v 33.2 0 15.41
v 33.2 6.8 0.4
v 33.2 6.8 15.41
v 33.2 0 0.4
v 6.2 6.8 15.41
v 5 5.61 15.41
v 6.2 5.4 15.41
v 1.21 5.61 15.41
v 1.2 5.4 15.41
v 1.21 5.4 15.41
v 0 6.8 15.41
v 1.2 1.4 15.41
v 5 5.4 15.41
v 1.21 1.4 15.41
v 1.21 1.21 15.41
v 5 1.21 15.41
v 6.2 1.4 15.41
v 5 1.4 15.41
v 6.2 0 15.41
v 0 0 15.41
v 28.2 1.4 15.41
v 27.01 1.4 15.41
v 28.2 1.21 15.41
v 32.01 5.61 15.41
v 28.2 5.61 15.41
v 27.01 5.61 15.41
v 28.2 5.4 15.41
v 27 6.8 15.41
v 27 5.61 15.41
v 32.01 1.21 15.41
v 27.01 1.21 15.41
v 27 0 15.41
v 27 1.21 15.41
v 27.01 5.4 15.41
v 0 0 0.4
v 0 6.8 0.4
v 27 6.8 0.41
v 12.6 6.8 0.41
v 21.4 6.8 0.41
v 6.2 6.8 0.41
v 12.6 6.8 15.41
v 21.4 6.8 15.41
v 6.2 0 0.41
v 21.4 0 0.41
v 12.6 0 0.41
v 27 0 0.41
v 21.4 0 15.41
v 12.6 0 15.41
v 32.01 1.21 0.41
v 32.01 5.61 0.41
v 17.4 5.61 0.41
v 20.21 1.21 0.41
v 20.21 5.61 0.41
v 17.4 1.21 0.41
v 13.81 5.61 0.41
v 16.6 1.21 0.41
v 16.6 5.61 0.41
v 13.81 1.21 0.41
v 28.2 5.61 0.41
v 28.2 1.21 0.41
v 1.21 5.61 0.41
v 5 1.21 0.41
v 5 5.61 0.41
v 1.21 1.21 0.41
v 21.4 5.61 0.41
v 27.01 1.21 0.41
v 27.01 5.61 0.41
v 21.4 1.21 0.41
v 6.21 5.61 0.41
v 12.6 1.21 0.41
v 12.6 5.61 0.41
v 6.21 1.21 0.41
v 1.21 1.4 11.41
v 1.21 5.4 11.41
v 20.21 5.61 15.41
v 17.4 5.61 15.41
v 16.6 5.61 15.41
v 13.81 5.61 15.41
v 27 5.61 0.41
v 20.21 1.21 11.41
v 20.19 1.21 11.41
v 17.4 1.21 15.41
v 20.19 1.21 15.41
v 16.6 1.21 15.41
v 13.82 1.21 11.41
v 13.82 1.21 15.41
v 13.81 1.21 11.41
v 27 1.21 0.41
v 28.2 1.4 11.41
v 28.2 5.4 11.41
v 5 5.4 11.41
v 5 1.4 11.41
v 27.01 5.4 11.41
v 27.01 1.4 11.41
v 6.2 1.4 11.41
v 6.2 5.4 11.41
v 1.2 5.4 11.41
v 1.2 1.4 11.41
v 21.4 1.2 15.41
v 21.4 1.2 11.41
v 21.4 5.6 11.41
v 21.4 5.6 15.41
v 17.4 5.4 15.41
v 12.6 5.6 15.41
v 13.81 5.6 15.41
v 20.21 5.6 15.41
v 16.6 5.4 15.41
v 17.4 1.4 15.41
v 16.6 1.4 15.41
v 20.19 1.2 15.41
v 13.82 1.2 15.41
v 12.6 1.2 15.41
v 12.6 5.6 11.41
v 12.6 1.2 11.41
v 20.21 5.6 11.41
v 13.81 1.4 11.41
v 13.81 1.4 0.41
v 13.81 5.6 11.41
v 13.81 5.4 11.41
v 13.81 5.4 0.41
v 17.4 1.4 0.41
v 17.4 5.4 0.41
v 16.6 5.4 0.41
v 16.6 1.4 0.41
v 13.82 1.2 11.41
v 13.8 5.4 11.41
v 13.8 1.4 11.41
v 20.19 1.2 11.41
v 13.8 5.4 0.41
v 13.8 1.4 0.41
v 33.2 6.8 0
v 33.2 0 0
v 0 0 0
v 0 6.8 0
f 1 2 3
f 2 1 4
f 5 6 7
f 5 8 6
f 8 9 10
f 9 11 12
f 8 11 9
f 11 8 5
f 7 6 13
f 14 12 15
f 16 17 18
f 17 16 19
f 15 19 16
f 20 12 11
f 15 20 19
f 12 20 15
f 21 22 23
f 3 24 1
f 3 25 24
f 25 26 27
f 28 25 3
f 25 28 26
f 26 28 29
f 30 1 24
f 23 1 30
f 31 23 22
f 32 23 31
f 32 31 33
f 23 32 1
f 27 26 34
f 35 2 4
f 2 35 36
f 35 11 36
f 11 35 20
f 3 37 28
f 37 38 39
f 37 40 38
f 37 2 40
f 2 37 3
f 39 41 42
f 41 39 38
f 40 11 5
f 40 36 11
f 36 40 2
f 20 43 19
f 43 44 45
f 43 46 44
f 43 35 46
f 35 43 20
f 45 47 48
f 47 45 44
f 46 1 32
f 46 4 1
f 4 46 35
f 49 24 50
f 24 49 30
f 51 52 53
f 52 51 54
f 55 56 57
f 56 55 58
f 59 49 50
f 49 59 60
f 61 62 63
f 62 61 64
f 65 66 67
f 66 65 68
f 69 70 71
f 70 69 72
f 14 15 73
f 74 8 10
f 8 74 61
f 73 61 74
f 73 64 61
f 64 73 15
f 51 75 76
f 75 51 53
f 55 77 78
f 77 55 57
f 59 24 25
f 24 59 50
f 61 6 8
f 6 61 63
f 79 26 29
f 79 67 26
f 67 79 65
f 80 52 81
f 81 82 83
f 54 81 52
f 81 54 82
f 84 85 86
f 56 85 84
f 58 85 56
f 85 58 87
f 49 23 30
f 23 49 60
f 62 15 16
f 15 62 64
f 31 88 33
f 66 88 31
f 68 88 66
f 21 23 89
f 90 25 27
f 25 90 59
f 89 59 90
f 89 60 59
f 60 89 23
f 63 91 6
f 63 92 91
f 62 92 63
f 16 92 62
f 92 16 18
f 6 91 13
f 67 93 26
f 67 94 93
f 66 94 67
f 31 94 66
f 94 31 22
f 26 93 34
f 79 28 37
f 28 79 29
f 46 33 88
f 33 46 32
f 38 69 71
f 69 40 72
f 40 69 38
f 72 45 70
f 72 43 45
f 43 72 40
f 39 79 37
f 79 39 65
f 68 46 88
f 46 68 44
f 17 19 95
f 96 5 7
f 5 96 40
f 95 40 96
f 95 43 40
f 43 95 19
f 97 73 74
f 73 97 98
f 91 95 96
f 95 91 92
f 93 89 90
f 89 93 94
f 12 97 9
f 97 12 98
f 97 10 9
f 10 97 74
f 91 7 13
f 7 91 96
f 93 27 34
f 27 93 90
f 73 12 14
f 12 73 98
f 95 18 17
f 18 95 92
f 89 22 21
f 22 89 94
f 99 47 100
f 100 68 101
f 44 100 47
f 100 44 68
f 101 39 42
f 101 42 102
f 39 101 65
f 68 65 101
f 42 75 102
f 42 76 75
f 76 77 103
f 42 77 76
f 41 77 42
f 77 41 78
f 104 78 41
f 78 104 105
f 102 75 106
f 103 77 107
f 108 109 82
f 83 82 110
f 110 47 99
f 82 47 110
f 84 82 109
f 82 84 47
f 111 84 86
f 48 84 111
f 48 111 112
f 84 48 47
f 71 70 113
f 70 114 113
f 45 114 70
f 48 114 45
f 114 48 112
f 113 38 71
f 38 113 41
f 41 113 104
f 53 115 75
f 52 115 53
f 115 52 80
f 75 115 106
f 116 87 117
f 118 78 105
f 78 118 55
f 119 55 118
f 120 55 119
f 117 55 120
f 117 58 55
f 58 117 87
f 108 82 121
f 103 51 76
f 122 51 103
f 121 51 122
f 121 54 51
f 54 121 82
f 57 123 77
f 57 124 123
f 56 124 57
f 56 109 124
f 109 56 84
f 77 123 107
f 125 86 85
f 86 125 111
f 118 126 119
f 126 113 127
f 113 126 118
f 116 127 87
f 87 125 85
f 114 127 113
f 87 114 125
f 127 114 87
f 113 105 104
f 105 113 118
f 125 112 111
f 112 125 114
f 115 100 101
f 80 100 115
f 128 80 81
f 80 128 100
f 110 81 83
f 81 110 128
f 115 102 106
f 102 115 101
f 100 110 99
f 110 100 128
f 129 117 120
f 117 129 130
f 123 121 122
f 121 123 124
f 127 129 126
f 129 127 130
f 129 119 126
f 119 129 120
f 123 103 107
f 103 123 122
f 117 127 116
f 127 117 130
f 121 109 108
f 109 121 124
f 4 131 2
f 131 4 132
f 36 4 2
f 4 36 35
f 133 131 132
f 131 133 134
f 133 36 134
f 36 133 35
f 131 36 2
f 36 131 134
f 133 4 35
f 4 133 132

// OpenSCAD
// file: ../../Base/PlacementOptions.scad
// Fischertechnik Box Foundation
// Placement Options

// Alignment
NoAlign = 0;
AlignLeft = 1;
AlignBottom = 2;
AlignCenter = 3;
AlignRight = 4;
AlignTop = 5;

// Element rotation degree steps
rotations = [0, -90, -180, -270];

// Rotation
NoRotation = 0;
Rotate0 = 0;
Rotate90 = 1;
Rotate180 = 2;
Rotate270 = 3;

// Docking (seen from above)
NoDock = -1;
DockLeft = 0;
DockTop = 1;
DockRight = 2;
DockCorner = 2;
DockBottom = 3;

// Web corners
LowerLeft = 0;
UpperLeft = 1;
UpperRight = 2;
LowerRight = 3;

// Web position relative to corner
LeftOfCorner = 0;
RightOfCorner = 1;
// file: ../../Base/Boxes.scad
// Fischertechnik Box Foundation
// Pre-designed Boxes

use <Constants.scad>

include <PlacementOptions.scad>

box190Width = 190;
box190Depth = 130;
box130Width = 130;
box130Depth = 95;

// Values are from an original ec3 box
topBottomDifference = 1.5;
outerHeight = 40;
baseThickness = 1.8;
innerHeight = outerHeight - baseThickness;
stackExcess = 5.7;
radius = 3.5;
wallThickness = 1.5;
tolerance = 0.2;

boxWallThickness = wallThickness;
boxBaseThickness = baseThickness;
boxWebWidth = 3.0;

// getBoxWallThickness()
// Gets the wall thickness of a Fischertechnik Box
function getBoxWallThickness() = boxWallThickness;

// getBoxUsageHeight(height = 38.2)
// Gets the usable height of a Fischertechnik box
// height = Outer height of the box from the bottom to the upper edge.
function getBoxUsageHeight(height = outerHeight) = height - baseThickness - stackExcess;

// getBoxInnerHeight()
// Gets the inner height of a Fischertechnik box, including the stack excess
function getBoxInnerHeight() = innerHeight;

// getBoxBaseThickness()
// Gets the thickness of the Fischertechnik box base.
function getBoxBaseThickness() = boxBaseThickness;

// getBoxWebWidth()
// Gets the width of a box web
function getBoxWebWidth() = boxWebWidth;

// getBox190Space()
// Gets the usable inner space of a Box 190 as an x/y-list
function getBox190Space() = [
    box190Width - 2*getBoxWallThickness() - topBottomDifference, 
    box190Depth - 2*getBoxWallThickness() - topBottomDifference ];

// RoundedCornerPlate(width, depth, height, radius)
// Creates a body plate with rounded corners for a box. Used
// also to create the complete box with the hull module.
// width = Width of the plate
// depth = depth of the plate 
// height = thickness of the plate
// radius = radius of the rounded corner
module RoundedCornerPlate(width, depth, height, radius) {
    translate([radius, radius])
    hull() {
        w = width-2*radius;
        d = depth-2*radius;
        cube([w, d, height]);
        cylinder(height, r=radius, $fn=getFragments());
        translate([w, 0])
            cylinder(height, r=radius, $fn=getFragments());
        translate([w, d])
            cylinder(height, r=radius, $fn=getFragments());
        translate([0, d])
            cylinder(height, r=radius, $fn=getFragments());
    }
}

// BoxBase(width, depth)
// Creates an empty stackable Fischertechnik compatible box
// width = Outer width of the box (190, 130, ...)
// depth = Outer depth of the box (130, 95, ...)

module BoxBase(width, depth, height=outerHeight) {    
    thinPlate = 0.01;

    innerHeight = height - baseThickness;    
    
    module Body(tolerance=tolerance) {
        hull() {
            // Bottom with tolerance to fit into the original boxes when stacked
            translate([-wallThickness+tolerance, -wallThickness+tolerance, -baseThickness])
                RoundedCornerPlate(width-topBottomDifference-2*tolerance, depth-topBottomDifference-2*tolerance, thinPlate, radius);
            
            // Top
            translate([-wallThickness-topBottomDifference/2, -wallThickness-topBottomDifference/2, innerHeight-thinPlate])
                RoundedCornerPlate(width, depth, thinPlate, radius);
         }
    }

    module Cutoff() {
        hull() {
            coWidth = width - 2*wallThickness;
            coDepth = depth - 2*wallThickness;
            
            // Bottom
            RoundedCornerPlate(coWidth-topBottomDifference, coDepth-topBottomDifference, thinPlate, radius);

            // Top
            translate([-topBottomDifference/2, -topBottomDifference/2, innerHeight+thinPlate]) 
                RoundedCornerPlate(coWidth, coDepth, thinPlate, radius);
        }
    }
    
    difference() {        
        Body();
        Cutoff();
        stackOffset = innerHeight - stackExcess;
        translate([0, 0, stackOffset + baseThickness])
            Body(tolerance=0);
    }
}

// Creates the Fischertechnik empty box 130x190 mm and places it at position 0,0
// 190x130 are the outer sizes, the inner space is slightly smaller. Use getBox190Space() to get the inner sizes.
// The box is positioned that the usable inner space is at the 0,0,0 position.

module Box190() {
    BoxBase(box190Width, box190Depth);
}

// Gets the usable inner space of a Box 130 as an x/y-list
function getBox130Space() = [
    box130Width - 2*getBoxWallThickness() - topBottomDifference, 
    box130Depth - 2*getBoxWallThickness() - topBottomDifference ];

// Creates the Fischertechnik empty box 95x130 mm and places it at position 0,0
// 190x130 are the outer sizes, the inner space is slightly smaller. Use getBox190Space() to get the inner sizes.
// The box is positioned that the usable inner space is at the 0,0,0 position.

module Box130() {
    BoxBase(box130Width, box130Depth);
}

// Creates a web at the specified box walls
// corner 0 = LowerLeft, 1 = UpperLeft, 2 = UpperRight, 3 = LowerRight
// side 0 = LeftOfCorner, 1 = RightOfCorner
// distance = Distance in mm from the corner
// boxSpace = inner width and depth of the box (default: Box 190)
// webWidth = length of the web (default is 3 mms)
// webThickness = thickness of the web (default is 1 mm)
// height = Height of the web (standard is getBoxUsageHeight())

module BoxWeb(corner, side, distance, boxSpace=getBox190Space(), webWidth=getBoxWebWidth(), webThickness=1.0, height=getBoxUsageHeight()) {
    sink = getBoxWallThickness()/2;

    width = (corner % 2 == 0) ? 
            (side == LeftOfCorner ? webWidth : webThickness) :
            (side == LeftOfCorner ? webThickness : webWidth);

    depth = (corner % 2 == 0) ? 
            (side == RightOfCorner ? webWidth : webThickness) :
            (side == RightOfCorner ? webThickness : webWidth);
    
    xDiff = corner == LowerLeft ? 
                (side == LeftOfCorner ? -sink : distance) :
            (corner == UpperLeft ?                
                (side == LeftOfCorner ? distance : -sink) :
            (corner == UpperRight ?
                (side == LeftOfCorner ? boxSpace.x-webWidth+sink : boxSpace.x-distance-webThickness) :
                (side == LeftOfCorner ? boxSpace.x-distance-webThickness: boxSpace.x-webWidth+sink)));

    yDiff = corner == LowerLeft ? 
                (side == RightOfCorner ? -sink : distance) :
            (corner == UpperLeft ?
                (side == RightOfCorner ? boxSpace.y-distance-webThickness : boxSpace.y-webWidth+sink) :
            (corner == UpperRight ?
                (side == RightOfCorner ? boxSpace.y-webWidth+sink : boxSpace.y-distance-webThickness) :
                (side == RightOfCorner ? distance : -sink)));
    
    translate([xDiff, yDiff, -getExcess()])
        cube([width, depth, height + 2*getExcess()]);
}
// file: ../../Base/Rotation.scad
// Fischertechnik Box Foundation
// Geometry Helpers Rotation

include <PlacementOptions.scad>

// getRotatedSpace(space, rotation=NoRotation)
// Rotates the space dependent on the specified rotation

function getRotatedSpace(space, rotation=NoRotation) = [
    (rotation == Rotate90 || rotation == Rotate270) ? space.y : space.x,
    (rotation == Rotate90 || rotation == Rotate270) ? space.x : space.y
];

// Rotates the given space around the fixed left lower corner
// space = the space the children needs as width/depth list [width,depth]
// rotation = 0 Rotate0 degrees, 1 Rotate90 degrees, 2 Rotate180 degrees, 3 Rotate270 degrees (equivalent to -90)

module RotateFix(space, rotation=NoRotation) {
    dy = (rotation == Rotate0 || rotation == Rotate270) ? 0 :
        (rotation == Rotate90) ? space.x :
        space.y;
    dx = (rotation < Rotate180) ? 0 :
        (rotation == Rotate180) ? space.x :
        space.y;
    
    translate([dx, dy, 0])
        rotate([0, 0, rotations[rotation]])
            children();
}
// file: ../../Base/Alignment.scad
// Fischertechnik Box Foundation
// Geometry Helpers Alignment

include <PlacementOptions.scad>

// getAlignedX(elementWidth, spaceWidth, align=AlignRight, offset=0)
// Gets the aligned X offset of an element with the given
// width in the given space.
// elementWidth = The width of the element to positon
// spaceWidth = The space where the element should be aligned
// align = 0 AlignLeft, 1 AlignCenter, 2 AlignRight
// offset = an optional offset from the aligned position. When
// aligned left or centered, then positive values are in X direction.
// When aligned right then positive values are in negative X direction.

function getAlignedX(elementWidth, spaceWidth, align=AlignRight, offset=0) =
    (align == AlignLeft) ?
        offset :
        ((align == AlignCenter) ?
        (spaceWidth - elementWidth)/2 + offset :
        spaceWidth - offset - elementWidth);

// getAlignedY(elementDepth, spaceDepth, align=AlignTop, offset=0)
// Gets the aligned Y offset of an element with the given
// depth in the given space.
// elementDepth = The depth of the element to positon
// spaceDepth = The space where the element should be aligned
// align = 0 AlignBottom, 1 AlignCenter, 2 AlignTop
// offset = an optional offset from the aligned position. When
// aligned bottom or centered, then positive values are in Y direction.
// When aligned top then positive values are in negative Y direction.

function getAlignedY(elementDepth, spaceDepth, align=AlignTop, offset=0) =
    (align == AlignBottom) ?
        offset :
        ((align == AlignCenter) ?
        (spaceDepth - elementDepth)/2 + offset :
        spaceDepth - offset - elementDepth);
// file: ../../Elements/FrameAxis30.scad
// Fischertechnik Box Library
// Frame for single 30 mm Axis
// 31034
// For standing axis see CylinderAxis30

use <../ModelBase/Complex.scad>

length = 30;

// getFrameAxis30Space()
// Gets the width (.x) and depth (.y) of the axis frame.

function getFrameAxis30Space() = getFrameAxisSpace(length);

// FrameAxis30()
// Axis holder for a single 30 mm axis.
// For standing axis see CylinderAxis30

module FrameAxis30() {
    FrameAxis(length);
}

// Test
color("lightgray")
FrameAxis30();
// file: ../../Base/Placement.scad
// Fischertechnik Box Foundation
// Geometry Helpers Placement

use <Constants.scad>
use <Alignment.scad>
use <Rotation.scad>
use <Boxes.scad>

include <PlacementOptions.scad>

// Place(x=0, y=0, elementSpace=[0,0], alignX=AlignLeft, alignY=AlignBottom, rotation=Rotate0, boxSpace=getBox190Space())
// Places the child at the specified position
// y = Y-Position. This is a relative position when an X aligment is specified.
// x = X-Position. This is a relative position when an Y aligment is specified.
// elementSpace = space of the element to be placed [x,y]
// alignX = -1=NoAlign, 0 AlignLeft, 1 AlignCenter, 3 AlignRight (elementSpace and boxSpace required!)
// alignY = -1=NoAlign, 2 AlignBottom, 1 AlignCenter, 4 AlignTop (elementSpace and boxSpace required!)
// rotation = 0 Rotate0 0 degrees, 1 Rotate90 90 degrees, 
// 2 Rotate180 180 degrees, 3 Rotate270 270 degrees (equivalent to -90)
// boxSpace = Inner space of the box where the placement occurs [x,y] - default is Box 190x130 inner space

module Place(x=0, y=0, elementSpace=[0,0], 
  alignX=AlignLeft, alignY=AlignBottom, 
  rotation=NoRotation, boxSpace=getBox190Space()) {

    module Position(x, y, space, rotation=Rotate0) {
        translate([x, y, 0])
            RotateFix(space, rotation)
                children();
    }

    space = getRotatedSpace(elementSpace, rotation);
    alignedX = getAlignedX(space.x, boxSpace.x, alignX, x);
    alignedY = getAlignedY(space.y, boxSpace.y, alignY, y);
    Position(alignedX, alignedY, elementSpace, rotation)
        children();
}

// Center(space=getBox130Space(), elementSpace=[0,0])
// space = Space where the children is centered. For cylinder use centered=true and no elementSpace.
// elementSpace = space of the element to be centered [x,y]

module Center(space=getBox190Space(), elementSpace=[0,0]) {
    Place(elementSpace=elementSpace, boxSpace=space, alignX=AlignCenter, alignY=AlignCenter)
        children();
}

// CenterHorizontal(width=0, y=0, offset=0, space=getBox130Space())
// width = Width of the element to be placed.
// y = Y position of the element
// offset = Offset from the center position (negative will be left of the center)
// space = Space where the element is placed

module CenterHorizontal(width=0, y=0, offset=0, space=getBox190Space()) {
    Place(x=offset, y=y, elementSpace=[width, 0], boxSpace=space, alignX=AlignCenter)
        children(0);
}

// CenterVertical(depth=0, x=0, offset=0, space=getBox130Space())
// depth = Depth of the element to be placed.
// x = X position of the element
// offset = Offset from the center position (negative will be down of the center)
// space = Space where the element is placed

module CenterVertical(depth=0, x=0, offset=0, space=getBox190Space()) {
    Place(x=x, y=offset, elementSpace=[0, depth], boxSpace=space, alignY=AlignCenter)
        children(0);
}

// getIsVertical(align)
// True if the specified alignment needs a vertical orientation for a divider (AlignRight, AlignLeft)

function getIsVertical(align) = (align == AlignRight || align == AlignLeft);

// getIsHorizontal(align)
// True if the specified alignment needs a horizontal orientation for a divider (AlignTop, AlignBottom)

function getIsHorizontal(align) = (align == AlignTop || align == AlignBottom);
// file: ../../Elements/AxisClip10.scad
// Fischertechnik Box Library
// Axis for clip 10
// 31023

use <../ModelBase/Simple.scad>
use <../Base/Constants.scad>

/* [Element Parameters] */
height = 23;
clipHeight = 10;

/* [Hidden] */
width = 12;
depth = 12;
upperDiameter = 3.6;

// getAxisClip10Space()
// Gets the space of a n axis for a clip 10 with spring ring (mot2)

function getAxisClip10Space() = [width, depth, height];

// AxisClip10(height, clipHeight)
// Axis for clip 10 with spring ring (mot2)
// height = Height of the complete axis (standard is 23, in mot3 its only 12)
// clipHeight = Height of the part for the clip (standard is 10, in mot3 its only 7)

module AxisClip10(height=height, clipHeight=clipHeight) {
    LeveledAxisWithSpace(height, height-clipHeight, getAxisClip10Space(), diameter=upperDiameter);
}

// Test
color("lightgray")
AxisClip10(height, clipHeight);
// file: ../../Base/Constants.scad
// Fischertechnik Box Foundation
// Constants

// Constant values necessary for multiple elements

// Base constants
dividerThickness = 1.2;
excess = 0.01;
fragments = 90;
tolerance = 0.8;

// Gets the thickness of a divider 
function getDividerThickness() = dividerThickness;

// Gets the excess that is used to merge walls into each other
function getExcess() = excess;

// Gets amount of fragments of a cylinder
function getFragments() = fragments;

// Gets the inner tolerance of a frame to each side
function getTolerance() = tolerance;


// Fischertechnik specific constants
axisDiameter = 4;
axisBottomDiameter = axisDiameter + 1;
axisTolerance = 0.2;

// Gets axis diameter of Fischertechnik axis
function getAxisDiameter() = axisDiameter;

// Gets axis diameter tolerance (subtracted for element axis)
function getAxisTolerance() = axisTolerance;

// Gets the axis diameter for standing axis
function getStandAxisDiameter() = getAxisDiameter() - getAxisTolerance();

// Gets axis bottom diameter for thicker part at the bottom
function getAxisBottomDiameter() = axisBottomDiameter;

standardEdgeDistance = 2.5;
standardWebDistance = 11.5;
standardCornerLength = 15;

// gets the standard distance to the wall of the box for dockable frames with webs
function getStandardEdgeDistance() = standardEdgeDistance;

// gets the standard distance of each web to the corner of the dockable frame
function getStandardWebDistance() = standardWebDistance;

// gets the standard length of the corner walls of a dockable frame
function getStandardCornerLength() = standardCornerLength;

tubeWallFactor = 0.8;

// gets the wall thickness of a tube.
function getTubeWallThickness() = tubeWallFactor * getDividerThickness();

smallPartsFrameHeight = 20;

// gets the frame height for docked small parts boxes.
function getSmallPartsFrameHeight() = smallPartsFrameHeight;

hubRingDiameter = 19.5;
hubRingLevelDiameter = 21;

// gets the diameter of a tube matching the inner ring of a wheel
function getHubRingDiameter() = hubRingDiameter;

// gets the diameter of a hub tube with a thicker diameter
function getHubRingLevelDiameter() = hubRingLevelDiameter;
// file: ../../Elements/FrameConnectingRod30.scad
// Fischertechnik Box Library
// Frame for single 30 mm connecting rod
// 37276

use <../Base/Constants.scad>
use <../Base/Placement.scad>
use <../ModelBase/Complex.scad>
use <FrameAxis30.scad>

/* [Hidden] */
length = 30;
bearingLength = 5;

// getFrameConnectingRod30Space()
// Gets the width (.x) and depth (.y) of the axis frame.

function getFrameConnectingRod30Space() = getFrameAxis30Space();

// FrameConnectingRod30()
// Axis holder for a single 30 mm connecting rod.

module FrameConnectingRod30() {
    ElevatedFramesWithCutoff([length, getAxisDiameter(), getAxisDiameter()], getFrameAxisDepth(), getFrameAxisHeight(), bearingLength);
    CenterHorizontal(getAxisMiddleSupportSpace().x, space = getFrameAxis30Space())
        AxisMiddleSupport();
}

// Test
color("lightgray")
FrameConnectingRod30();
// file: ../TestPrint.scad
// 3D Print Test Base

use <../Base/Constants.scad>

use <../Elements/AxisClip10.scad>

module TestPrint(elementSpace) {
    cube([elementSpace.x, elementSpace.y, 0.4]);
    translate([0,0,0.4+getExcess()]) {
        children();
    }
}

TestPrint(getAxisClip10Space())
    AxisClip10();
// main file
// 3D Print Test
// FrameConnectingRod30

use <../TestPrint.scad>
use <../../Elements/FrameConnectingRod30.scad>

TestPrint(getFrameConnectingRod30Space())
    FrameConnectingRod30();
